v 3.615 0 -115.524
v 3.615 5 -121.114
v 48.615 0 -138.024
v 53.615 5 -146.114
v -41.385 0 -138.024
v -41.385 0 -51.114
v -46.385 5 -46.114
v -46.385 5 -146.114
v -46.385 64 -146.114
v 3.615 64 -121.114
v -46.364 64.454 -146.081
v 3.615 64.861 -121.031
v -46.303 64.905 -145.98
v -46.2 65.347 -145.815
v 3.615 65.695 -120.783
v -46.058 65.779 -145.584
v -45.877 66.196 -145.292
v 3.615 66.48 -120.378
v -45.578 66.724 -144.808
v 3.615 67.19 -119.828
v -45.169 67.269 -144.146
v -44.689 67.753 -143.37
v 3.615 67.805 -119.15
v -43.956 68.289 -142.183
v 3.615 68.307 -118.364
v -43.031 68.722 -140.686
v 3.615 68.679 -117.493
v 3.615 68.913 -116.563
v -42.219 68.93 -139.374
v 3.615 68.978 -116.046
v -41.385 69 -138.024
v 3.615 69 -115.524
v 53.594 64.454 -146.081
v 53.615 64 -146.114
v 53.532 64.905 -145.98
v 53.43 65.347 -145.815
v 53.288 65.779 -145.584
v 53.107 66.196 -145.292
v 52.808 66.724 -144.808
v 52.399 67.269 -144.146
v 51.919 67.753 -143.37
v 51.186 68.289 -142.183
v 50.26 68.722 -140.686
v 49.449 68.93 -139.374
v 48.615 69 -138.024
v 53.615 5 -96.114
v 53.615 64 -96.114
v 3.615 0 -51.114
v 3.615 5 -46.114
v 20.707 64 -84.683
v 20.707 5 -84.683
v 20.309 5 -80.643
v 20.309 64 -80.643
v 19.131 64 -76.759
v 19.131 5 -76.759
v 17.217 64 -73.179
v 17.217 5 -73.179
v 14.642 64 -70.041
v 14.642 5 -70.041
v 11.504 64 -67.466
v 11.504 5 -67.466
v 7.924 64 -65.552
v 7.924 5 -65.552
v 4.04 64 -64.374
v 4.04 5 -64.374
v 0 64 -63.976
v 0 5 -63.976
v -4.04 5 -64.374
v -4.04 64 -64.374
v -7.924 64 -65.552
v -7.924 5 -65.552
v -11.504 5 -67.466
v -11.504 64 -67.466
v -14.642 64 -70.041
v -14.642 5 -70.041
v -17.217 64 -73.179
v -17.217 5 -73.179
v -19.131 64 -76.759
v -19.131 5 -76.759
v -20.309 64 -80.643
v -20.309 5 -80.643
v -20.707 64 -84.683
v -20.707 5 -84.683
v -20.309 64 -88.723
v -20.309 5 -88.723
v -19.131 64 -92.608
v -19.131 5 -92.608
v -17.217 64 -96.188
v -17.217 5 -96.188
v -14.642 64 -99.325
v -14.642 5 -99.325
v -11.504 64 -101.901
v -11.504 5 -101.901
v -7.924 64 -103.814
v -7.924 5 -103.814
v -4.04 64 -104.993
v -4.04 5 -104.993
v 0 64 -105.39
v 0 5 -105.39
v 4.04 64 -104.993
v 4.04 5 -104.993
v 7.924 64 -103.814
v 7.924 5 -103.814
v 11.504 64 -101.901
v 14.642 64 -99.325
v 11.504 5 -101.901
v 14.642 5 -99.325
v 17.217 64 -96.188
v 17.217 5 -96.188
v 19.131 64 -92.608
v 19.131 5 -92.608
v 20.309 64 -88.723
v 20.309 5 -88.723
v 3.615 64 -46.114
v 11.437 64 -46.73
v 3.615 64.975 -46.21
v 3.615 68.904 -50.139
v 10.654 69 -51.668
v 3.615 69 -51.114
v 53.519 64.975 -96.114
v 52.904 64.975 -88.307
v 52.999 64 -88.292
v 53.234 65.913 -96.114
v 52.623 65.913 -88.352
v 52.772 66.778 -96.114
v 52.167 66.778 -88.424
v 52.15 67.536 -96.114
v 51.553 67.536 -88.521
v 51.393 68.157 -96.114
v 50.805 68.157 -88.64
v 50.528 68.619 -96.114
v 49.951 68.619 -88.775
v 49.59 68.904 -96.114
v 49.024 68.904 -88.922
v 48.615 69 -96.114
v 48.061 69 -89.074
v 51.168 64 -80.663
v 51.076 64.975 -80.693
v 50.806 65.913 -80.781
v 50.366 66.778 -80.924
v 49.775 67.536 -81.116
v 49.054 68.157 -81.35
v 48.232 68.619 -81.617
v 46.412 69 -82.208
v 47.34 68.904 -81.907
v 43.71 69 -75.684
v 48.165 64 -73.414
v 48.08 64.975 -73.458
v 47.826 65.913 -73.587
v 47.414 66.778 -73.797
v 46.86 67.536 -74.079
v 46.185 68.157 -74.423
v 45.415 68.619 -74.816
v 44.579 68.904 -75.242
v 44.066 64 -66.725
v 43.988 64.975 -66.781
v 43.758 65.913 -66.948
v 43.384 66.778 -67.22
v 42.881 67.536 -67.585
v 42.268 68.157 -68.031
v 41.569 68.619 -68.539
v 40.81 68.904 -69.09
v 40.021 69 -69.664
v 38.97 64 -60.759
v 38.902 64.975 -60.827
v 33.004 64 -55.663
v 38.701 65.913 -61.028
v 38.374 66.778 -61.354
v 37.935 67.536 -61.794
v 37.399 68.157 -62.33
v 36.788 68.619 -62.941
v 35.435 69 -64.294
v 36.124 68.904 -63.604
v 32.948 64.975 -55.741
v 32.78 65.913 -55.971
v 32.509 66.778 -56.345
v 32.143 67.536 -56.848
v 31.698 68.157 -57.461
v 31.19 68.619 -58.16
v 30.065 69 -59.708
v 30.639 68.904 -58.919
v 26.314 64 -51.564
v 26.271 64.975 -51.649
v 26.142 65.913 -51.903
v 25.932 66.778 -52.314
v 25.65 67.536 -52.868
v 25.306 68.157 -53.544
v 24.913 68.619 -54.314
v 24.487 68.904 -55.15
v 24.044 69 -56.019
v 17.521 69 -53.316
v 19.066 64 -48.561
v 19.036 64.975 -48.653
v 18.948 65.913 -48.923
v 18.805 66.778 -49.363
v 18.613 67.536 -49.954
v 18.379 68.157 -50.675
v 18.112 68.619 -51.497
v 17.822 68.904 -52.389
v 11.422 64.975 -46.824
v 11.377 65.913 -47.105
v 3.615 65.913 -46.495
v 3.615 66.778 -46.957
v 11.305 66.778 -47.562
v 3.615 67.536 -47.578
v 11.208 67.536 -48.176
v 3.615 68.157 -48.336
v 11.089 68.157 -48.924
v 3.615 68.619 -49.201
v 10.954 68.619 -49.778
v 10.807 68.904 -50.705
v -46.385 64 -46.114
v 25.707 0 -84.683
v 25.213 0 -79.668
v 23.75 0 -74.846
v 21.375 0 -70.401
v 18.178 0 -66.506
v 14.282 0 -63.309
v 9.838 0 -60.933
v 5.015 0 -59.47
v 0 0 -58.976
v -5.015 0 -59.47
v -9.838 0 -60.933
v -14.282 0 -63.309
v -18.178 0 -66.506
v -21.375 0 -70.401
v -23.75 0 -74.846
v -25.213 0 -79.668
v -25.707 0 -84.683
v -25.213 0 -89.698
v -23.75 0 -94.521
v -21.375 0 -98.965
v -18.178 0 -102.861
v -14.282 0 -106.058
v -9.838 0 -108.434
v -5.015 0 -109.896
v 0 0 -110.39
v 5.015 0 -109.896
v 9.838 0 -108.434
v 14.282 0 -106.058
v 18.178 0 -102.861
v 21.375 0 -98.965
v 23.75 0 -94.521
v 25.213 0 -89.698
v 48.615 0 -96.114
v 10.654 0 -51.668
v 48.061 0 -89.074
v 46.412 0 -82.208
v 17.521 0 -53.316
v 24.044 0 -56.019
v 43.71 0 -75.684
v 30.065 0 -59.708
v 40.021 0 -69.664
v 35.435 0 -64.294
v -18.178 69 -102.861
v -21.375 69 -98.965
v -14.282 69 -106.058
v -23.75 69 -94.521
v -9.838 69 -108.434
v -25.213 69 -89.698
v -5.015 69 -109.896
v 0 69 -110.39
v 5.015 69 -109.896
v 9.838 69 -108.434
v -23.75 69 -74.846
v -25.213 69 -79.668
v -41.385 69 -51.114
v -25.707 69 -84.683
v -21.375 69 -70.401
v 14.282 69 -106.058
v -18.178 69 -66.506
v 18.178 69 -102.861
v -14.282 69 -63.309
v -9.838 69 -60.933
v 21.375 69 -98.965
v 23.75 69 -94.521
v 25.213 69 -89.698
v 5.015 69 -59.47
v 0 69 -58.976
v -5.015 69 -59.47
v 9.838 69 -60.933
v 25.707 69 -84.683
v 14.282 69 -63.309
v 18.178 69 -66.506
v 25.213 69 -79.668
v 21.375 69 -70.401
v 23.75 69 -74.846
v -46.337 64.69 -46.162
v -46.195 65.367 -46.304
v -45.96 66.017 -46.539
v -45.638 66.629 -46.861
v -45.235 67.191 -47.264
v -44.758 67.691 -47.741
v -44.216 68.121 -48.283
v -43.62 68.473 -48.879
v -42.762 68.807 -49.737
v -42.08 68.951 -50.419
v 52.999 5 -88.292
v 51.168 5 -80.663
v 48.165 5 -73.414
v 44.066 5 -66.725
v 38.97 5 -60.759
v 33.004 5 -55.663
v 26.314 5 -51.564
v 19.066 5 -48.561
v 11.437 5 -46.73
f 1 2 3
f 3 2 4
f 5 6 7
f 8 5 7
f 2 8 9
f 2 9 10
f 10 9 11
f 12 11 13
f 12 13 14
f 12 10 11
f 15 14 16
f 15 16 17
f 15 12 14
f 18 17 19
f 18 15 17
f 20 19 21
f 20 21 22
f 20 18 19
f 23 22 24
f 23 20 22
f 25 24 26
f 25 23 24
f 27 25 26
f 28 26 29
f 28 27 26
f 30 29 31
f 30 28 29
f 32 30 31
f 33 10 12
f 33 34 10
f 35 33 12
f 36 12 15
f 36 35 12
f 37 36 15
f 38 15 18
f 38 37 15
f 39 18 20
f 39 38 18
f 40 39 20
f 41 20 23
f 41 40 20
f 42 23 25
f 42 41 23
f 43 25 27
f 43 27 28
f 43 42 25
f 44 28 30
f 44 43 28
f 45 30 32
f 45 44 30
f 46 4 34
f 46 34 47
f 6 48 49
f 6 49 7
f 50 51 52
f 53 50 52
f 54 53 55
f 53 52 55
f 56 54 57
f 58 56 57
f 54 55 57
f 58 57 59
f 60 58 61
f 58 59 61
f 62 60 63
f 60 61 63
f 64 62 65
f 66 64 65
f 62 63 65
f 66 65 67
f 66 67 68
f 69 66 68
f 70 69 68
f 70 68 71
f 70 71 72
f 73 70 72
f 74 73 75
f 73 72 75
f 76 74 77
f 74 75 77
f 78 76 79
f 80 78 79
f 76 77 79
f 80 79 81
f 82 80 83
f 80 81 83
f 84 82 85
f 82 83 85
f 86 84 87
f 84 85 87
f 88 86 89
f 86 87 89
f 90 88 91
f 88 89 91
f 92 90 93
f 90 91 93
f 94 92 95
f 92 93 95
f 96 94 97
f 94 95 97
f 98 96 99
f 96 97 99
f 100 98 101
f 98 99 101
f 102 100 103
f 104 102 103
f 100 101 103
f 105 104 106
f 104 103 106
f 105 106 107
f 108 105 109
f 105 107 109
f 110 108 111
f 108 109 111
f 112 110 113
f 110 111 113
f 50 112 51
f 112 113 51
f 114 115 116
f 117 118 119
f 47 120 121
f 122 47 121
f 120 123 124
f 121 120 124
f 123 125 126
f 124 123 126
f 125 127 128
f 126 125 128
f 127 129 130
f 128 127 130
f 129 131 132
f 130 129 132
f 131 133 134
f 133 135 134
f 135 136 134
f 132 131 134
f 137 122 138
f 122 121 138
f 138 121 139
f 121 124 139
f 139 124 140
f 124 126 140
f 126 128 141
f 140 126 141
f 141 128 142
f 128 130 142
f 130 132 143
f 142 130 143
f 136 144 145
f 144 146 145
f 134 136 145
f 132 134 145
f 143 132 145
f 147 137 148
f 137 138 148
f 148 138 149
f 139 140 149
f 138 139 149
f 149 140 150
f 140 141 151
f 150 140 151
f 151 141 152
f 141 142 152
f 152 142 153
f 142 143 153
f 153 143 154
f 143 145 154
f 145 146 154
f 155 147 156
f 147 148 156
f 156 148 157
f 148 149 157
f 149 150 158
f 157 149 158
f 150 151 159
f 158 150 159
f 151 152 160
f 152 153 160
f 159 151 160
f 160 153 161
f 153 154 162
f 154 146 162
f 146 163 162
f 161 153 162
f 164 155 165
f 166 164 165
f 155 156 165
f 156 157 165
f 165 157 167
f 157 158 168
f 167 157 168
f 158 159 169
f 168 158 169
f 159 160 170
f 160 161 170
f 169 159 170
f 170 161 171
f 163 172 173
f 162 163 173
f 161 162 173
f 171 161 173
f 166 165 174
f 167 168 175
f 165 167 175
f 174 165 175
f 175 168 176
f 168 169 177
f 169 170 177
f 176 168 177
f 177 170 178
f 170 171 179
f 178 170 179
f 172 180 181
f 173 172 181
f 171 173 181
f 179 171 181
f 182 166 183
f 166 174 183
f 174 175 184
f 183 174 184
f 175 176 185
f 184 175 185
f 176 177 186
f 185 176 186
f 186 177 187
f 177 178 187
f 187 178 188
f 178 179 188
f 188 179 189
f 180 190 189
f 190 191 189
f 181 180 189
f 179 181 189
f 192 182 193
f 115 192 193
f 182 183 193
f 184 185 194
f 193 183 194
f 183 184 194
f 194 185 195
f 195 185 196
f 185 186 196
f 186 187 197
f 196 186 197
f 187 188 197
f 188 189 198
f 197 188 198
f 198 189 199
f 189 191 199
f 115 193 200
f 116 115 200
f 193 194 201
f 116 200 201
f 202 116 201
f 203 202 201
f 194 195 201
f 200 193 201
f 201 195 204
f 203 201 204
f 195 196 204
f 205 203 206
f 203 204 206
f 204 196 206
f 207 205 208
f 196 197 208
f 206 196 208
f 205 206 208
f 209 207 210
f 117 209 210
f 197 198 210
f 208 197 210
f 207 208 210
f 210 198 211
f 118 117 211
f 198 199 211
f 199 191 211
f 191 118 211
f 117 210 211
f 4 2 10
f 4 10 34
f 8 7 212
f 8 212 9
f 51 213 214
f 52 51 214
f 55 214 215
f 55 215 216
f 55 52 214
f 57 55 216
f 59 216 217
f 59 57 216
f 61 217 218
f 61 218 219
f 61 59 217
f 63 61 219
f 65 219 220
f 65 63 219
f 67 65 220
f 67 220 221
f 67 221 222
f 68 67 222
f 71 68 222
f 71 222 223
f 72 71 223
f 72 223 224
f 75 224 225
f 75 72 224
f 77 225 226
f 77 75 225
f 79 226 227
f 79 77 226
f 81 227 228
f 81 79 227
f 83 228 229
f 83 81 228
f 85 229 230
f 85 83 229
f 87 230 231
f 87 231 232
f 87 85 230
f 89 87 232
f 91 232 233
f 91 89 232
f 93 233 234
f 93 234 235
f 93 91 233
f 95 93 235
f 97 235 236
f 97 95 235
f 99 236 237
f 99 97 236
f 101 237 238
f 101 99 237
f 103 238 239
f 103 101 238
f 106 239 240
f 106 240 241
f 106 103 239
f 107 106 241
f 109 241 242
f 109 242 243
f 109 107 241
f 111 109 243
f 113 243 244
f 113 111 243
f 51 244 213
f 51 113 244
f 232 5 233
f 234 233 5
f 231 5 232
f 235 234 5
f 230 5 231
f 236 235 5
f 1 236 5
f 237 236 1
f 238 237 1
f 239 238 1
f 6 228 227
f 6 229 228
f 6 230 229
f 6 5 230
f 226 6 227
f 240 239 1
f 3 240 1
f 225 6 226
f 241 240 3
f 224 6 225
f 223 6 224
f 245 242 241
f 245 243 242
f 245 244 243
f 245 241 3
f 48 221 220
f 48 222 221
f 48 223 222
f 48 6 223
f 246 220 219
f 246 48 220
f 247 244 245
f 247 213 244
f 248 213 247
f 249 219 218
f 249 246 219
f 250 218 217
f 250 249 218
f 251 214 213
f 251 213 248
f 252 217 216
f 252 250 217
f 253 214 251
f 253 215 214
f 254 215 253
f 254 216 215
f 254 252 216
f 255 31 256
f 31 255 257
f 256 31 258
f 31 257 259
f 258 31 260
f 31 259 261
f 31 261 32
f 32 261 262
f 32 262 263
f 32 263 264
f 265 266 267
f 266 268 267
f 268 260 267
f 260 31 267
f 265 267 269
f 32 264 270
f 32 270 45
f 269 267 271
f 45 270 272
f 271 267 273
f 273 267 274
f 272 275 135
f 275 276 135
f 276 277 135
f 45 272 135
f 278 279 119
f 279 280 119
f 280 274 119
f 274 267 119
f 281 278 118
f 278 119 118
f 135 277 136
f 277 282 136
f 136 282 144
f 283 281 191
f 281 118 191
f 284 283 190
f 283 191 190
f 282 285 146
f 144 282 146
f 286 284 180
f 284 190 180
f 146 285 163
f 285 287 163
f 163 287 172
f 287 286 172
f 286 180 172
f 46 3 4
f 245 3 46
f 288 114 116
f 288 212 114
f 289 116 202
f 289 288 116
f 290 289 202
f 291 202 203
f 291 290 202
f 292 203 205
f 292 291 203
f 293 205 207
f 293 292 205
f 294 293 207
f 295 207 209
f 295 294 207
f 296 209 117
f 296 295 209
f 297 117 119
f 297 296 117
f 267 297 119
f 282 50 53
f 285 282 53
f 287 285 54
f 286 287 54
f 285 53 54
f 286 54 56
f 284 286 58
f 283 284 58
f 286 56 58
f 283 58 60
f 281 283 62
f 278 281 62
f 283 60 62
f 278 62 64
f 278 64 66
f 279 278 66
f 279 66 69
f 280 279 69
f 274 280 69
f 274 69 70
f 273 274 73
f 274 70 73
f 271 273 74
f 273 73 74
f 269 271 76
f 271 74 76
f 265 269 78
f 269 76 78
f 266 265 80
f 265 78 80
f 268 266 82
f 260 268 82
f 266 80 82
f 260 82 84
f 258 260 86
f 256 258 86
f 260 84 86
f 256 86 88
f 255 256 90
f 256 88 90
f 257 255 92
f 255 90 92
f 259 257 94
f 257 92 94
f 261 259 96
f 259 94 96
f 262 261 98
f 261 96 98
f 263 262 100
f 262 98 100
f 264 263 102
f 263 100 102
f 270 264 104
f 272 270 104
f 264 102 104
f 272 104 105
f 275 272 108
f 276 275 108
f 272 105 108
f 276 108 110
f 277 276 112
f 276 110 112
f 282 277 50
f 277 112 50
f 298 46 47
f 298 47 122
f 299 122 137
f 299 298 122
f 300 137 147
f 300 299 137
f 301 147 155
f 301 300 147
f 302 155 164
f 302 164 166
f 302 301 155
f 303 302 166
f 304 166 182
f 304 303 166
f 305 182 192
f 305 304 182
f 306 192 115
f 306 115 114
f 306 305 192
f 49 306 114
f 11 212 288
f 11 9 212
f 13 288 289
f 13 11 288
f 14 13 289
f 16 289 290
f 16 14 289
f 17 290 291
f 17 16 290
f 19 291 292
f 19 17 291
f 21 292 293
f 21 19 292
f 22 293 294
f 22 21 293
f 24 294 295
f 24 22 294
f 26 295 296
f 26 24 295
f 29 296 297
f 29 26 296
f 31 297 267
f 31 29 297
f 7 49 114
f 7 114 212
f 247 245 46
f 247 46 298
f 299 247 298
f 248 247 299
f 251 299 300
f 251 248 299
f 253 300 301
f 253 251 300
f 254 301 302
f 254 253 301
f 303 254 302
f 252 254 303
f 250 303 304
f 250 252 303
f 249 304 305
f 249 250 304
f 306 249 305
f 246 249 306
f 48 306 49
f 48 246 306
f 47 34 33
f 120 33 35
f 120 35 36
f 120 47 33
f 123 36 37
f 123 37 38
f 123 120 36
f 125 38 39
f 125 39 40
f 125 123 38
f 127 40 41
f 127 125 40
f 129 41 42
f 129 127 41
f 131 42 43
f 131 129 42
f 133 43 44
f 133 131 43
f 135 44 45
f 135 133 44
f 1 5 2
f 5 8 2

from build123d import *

# Parameters (mm, degrees)
F1_DEPTH = 69
F2_R     = 5
F3_SIZE  = 5
F4_R     = 20.707169
F5_DEPTH = 69
F6_SIZE  = 5


with BuildPart() as f1:
    # F0 (on Front) → F1 (new body)
    with BuildSketch(Plane.XZ):
        with BuildLine():
            Line((-46.385089, -46.113969), (-46.385089, -96.113969))
            Line((-46.385089, -96.113969), (-46.385089, -146.113969))
            Line((-46.385089, -146.113969), (3.614911, -121.113969))
            Line((3.614911, -121.113969), (53.614911, -146.113969))
            Line((53.614911, -146.113969), (53.614911, -96.113969))
            ThreePointArc((53.614911, -96.113969), (38.97025, -60.75863), (3.614911, -46.113969))
            Line((3.614911, -46.113969), (-46.385089, -46.113969))
        make_face()
    extrude(amount=-F1_DEPTH)

    # F2
    f2_edges = [f1.edges().sort_by_distance(p)[0] for p in [
        (-21.385089, 69, -46.113969),
        (-46.385089, 69, -96.113969),
        (-21.385089, 69, -133.613969),
        (28.614911, 69, -133.613969),
        (53.614911, 69, -121.113969),
        (38.97025, 69, -60.75863),
    ]]
    fillet(f2_edges, radius=F2_R)

    # F3
    f3_edges = [f1.edges().sort_by_distance(p)[0] for p in [
        (-21.385089, 0, -46.113969),
        (-46.385089, 0, -96.113969),
        (-21.385089, 0, -133.613969),
        (28.614911, 0, -133.613969),
        (53.614911, 0, -121.113969),
        (38.97025, 0, -60.75863),
    ]]
    chamfer(f3_edges, length=F3_SIZE)

    # F4 (on face) → F5 (cut)
    with BuildSketch(Plane.XZ):
        with Locations((0, -84.683239)):
            Circle(F4_R)
    extrude(amount=-F5_DEPTH, mode=Mode.SUBTRACT)

    # F6
    f6_edges = [f1.edges().sort_by_distance(p)[0] for p in [
        (20.707169, 34.5, -84.683239),
        (-20.707169, 0, -84.683239),
        (-20.707169, 69, -84.683239),
    ]]
    chamfer(f6_edges, length=F6_SIZE)


solid = f1.part
